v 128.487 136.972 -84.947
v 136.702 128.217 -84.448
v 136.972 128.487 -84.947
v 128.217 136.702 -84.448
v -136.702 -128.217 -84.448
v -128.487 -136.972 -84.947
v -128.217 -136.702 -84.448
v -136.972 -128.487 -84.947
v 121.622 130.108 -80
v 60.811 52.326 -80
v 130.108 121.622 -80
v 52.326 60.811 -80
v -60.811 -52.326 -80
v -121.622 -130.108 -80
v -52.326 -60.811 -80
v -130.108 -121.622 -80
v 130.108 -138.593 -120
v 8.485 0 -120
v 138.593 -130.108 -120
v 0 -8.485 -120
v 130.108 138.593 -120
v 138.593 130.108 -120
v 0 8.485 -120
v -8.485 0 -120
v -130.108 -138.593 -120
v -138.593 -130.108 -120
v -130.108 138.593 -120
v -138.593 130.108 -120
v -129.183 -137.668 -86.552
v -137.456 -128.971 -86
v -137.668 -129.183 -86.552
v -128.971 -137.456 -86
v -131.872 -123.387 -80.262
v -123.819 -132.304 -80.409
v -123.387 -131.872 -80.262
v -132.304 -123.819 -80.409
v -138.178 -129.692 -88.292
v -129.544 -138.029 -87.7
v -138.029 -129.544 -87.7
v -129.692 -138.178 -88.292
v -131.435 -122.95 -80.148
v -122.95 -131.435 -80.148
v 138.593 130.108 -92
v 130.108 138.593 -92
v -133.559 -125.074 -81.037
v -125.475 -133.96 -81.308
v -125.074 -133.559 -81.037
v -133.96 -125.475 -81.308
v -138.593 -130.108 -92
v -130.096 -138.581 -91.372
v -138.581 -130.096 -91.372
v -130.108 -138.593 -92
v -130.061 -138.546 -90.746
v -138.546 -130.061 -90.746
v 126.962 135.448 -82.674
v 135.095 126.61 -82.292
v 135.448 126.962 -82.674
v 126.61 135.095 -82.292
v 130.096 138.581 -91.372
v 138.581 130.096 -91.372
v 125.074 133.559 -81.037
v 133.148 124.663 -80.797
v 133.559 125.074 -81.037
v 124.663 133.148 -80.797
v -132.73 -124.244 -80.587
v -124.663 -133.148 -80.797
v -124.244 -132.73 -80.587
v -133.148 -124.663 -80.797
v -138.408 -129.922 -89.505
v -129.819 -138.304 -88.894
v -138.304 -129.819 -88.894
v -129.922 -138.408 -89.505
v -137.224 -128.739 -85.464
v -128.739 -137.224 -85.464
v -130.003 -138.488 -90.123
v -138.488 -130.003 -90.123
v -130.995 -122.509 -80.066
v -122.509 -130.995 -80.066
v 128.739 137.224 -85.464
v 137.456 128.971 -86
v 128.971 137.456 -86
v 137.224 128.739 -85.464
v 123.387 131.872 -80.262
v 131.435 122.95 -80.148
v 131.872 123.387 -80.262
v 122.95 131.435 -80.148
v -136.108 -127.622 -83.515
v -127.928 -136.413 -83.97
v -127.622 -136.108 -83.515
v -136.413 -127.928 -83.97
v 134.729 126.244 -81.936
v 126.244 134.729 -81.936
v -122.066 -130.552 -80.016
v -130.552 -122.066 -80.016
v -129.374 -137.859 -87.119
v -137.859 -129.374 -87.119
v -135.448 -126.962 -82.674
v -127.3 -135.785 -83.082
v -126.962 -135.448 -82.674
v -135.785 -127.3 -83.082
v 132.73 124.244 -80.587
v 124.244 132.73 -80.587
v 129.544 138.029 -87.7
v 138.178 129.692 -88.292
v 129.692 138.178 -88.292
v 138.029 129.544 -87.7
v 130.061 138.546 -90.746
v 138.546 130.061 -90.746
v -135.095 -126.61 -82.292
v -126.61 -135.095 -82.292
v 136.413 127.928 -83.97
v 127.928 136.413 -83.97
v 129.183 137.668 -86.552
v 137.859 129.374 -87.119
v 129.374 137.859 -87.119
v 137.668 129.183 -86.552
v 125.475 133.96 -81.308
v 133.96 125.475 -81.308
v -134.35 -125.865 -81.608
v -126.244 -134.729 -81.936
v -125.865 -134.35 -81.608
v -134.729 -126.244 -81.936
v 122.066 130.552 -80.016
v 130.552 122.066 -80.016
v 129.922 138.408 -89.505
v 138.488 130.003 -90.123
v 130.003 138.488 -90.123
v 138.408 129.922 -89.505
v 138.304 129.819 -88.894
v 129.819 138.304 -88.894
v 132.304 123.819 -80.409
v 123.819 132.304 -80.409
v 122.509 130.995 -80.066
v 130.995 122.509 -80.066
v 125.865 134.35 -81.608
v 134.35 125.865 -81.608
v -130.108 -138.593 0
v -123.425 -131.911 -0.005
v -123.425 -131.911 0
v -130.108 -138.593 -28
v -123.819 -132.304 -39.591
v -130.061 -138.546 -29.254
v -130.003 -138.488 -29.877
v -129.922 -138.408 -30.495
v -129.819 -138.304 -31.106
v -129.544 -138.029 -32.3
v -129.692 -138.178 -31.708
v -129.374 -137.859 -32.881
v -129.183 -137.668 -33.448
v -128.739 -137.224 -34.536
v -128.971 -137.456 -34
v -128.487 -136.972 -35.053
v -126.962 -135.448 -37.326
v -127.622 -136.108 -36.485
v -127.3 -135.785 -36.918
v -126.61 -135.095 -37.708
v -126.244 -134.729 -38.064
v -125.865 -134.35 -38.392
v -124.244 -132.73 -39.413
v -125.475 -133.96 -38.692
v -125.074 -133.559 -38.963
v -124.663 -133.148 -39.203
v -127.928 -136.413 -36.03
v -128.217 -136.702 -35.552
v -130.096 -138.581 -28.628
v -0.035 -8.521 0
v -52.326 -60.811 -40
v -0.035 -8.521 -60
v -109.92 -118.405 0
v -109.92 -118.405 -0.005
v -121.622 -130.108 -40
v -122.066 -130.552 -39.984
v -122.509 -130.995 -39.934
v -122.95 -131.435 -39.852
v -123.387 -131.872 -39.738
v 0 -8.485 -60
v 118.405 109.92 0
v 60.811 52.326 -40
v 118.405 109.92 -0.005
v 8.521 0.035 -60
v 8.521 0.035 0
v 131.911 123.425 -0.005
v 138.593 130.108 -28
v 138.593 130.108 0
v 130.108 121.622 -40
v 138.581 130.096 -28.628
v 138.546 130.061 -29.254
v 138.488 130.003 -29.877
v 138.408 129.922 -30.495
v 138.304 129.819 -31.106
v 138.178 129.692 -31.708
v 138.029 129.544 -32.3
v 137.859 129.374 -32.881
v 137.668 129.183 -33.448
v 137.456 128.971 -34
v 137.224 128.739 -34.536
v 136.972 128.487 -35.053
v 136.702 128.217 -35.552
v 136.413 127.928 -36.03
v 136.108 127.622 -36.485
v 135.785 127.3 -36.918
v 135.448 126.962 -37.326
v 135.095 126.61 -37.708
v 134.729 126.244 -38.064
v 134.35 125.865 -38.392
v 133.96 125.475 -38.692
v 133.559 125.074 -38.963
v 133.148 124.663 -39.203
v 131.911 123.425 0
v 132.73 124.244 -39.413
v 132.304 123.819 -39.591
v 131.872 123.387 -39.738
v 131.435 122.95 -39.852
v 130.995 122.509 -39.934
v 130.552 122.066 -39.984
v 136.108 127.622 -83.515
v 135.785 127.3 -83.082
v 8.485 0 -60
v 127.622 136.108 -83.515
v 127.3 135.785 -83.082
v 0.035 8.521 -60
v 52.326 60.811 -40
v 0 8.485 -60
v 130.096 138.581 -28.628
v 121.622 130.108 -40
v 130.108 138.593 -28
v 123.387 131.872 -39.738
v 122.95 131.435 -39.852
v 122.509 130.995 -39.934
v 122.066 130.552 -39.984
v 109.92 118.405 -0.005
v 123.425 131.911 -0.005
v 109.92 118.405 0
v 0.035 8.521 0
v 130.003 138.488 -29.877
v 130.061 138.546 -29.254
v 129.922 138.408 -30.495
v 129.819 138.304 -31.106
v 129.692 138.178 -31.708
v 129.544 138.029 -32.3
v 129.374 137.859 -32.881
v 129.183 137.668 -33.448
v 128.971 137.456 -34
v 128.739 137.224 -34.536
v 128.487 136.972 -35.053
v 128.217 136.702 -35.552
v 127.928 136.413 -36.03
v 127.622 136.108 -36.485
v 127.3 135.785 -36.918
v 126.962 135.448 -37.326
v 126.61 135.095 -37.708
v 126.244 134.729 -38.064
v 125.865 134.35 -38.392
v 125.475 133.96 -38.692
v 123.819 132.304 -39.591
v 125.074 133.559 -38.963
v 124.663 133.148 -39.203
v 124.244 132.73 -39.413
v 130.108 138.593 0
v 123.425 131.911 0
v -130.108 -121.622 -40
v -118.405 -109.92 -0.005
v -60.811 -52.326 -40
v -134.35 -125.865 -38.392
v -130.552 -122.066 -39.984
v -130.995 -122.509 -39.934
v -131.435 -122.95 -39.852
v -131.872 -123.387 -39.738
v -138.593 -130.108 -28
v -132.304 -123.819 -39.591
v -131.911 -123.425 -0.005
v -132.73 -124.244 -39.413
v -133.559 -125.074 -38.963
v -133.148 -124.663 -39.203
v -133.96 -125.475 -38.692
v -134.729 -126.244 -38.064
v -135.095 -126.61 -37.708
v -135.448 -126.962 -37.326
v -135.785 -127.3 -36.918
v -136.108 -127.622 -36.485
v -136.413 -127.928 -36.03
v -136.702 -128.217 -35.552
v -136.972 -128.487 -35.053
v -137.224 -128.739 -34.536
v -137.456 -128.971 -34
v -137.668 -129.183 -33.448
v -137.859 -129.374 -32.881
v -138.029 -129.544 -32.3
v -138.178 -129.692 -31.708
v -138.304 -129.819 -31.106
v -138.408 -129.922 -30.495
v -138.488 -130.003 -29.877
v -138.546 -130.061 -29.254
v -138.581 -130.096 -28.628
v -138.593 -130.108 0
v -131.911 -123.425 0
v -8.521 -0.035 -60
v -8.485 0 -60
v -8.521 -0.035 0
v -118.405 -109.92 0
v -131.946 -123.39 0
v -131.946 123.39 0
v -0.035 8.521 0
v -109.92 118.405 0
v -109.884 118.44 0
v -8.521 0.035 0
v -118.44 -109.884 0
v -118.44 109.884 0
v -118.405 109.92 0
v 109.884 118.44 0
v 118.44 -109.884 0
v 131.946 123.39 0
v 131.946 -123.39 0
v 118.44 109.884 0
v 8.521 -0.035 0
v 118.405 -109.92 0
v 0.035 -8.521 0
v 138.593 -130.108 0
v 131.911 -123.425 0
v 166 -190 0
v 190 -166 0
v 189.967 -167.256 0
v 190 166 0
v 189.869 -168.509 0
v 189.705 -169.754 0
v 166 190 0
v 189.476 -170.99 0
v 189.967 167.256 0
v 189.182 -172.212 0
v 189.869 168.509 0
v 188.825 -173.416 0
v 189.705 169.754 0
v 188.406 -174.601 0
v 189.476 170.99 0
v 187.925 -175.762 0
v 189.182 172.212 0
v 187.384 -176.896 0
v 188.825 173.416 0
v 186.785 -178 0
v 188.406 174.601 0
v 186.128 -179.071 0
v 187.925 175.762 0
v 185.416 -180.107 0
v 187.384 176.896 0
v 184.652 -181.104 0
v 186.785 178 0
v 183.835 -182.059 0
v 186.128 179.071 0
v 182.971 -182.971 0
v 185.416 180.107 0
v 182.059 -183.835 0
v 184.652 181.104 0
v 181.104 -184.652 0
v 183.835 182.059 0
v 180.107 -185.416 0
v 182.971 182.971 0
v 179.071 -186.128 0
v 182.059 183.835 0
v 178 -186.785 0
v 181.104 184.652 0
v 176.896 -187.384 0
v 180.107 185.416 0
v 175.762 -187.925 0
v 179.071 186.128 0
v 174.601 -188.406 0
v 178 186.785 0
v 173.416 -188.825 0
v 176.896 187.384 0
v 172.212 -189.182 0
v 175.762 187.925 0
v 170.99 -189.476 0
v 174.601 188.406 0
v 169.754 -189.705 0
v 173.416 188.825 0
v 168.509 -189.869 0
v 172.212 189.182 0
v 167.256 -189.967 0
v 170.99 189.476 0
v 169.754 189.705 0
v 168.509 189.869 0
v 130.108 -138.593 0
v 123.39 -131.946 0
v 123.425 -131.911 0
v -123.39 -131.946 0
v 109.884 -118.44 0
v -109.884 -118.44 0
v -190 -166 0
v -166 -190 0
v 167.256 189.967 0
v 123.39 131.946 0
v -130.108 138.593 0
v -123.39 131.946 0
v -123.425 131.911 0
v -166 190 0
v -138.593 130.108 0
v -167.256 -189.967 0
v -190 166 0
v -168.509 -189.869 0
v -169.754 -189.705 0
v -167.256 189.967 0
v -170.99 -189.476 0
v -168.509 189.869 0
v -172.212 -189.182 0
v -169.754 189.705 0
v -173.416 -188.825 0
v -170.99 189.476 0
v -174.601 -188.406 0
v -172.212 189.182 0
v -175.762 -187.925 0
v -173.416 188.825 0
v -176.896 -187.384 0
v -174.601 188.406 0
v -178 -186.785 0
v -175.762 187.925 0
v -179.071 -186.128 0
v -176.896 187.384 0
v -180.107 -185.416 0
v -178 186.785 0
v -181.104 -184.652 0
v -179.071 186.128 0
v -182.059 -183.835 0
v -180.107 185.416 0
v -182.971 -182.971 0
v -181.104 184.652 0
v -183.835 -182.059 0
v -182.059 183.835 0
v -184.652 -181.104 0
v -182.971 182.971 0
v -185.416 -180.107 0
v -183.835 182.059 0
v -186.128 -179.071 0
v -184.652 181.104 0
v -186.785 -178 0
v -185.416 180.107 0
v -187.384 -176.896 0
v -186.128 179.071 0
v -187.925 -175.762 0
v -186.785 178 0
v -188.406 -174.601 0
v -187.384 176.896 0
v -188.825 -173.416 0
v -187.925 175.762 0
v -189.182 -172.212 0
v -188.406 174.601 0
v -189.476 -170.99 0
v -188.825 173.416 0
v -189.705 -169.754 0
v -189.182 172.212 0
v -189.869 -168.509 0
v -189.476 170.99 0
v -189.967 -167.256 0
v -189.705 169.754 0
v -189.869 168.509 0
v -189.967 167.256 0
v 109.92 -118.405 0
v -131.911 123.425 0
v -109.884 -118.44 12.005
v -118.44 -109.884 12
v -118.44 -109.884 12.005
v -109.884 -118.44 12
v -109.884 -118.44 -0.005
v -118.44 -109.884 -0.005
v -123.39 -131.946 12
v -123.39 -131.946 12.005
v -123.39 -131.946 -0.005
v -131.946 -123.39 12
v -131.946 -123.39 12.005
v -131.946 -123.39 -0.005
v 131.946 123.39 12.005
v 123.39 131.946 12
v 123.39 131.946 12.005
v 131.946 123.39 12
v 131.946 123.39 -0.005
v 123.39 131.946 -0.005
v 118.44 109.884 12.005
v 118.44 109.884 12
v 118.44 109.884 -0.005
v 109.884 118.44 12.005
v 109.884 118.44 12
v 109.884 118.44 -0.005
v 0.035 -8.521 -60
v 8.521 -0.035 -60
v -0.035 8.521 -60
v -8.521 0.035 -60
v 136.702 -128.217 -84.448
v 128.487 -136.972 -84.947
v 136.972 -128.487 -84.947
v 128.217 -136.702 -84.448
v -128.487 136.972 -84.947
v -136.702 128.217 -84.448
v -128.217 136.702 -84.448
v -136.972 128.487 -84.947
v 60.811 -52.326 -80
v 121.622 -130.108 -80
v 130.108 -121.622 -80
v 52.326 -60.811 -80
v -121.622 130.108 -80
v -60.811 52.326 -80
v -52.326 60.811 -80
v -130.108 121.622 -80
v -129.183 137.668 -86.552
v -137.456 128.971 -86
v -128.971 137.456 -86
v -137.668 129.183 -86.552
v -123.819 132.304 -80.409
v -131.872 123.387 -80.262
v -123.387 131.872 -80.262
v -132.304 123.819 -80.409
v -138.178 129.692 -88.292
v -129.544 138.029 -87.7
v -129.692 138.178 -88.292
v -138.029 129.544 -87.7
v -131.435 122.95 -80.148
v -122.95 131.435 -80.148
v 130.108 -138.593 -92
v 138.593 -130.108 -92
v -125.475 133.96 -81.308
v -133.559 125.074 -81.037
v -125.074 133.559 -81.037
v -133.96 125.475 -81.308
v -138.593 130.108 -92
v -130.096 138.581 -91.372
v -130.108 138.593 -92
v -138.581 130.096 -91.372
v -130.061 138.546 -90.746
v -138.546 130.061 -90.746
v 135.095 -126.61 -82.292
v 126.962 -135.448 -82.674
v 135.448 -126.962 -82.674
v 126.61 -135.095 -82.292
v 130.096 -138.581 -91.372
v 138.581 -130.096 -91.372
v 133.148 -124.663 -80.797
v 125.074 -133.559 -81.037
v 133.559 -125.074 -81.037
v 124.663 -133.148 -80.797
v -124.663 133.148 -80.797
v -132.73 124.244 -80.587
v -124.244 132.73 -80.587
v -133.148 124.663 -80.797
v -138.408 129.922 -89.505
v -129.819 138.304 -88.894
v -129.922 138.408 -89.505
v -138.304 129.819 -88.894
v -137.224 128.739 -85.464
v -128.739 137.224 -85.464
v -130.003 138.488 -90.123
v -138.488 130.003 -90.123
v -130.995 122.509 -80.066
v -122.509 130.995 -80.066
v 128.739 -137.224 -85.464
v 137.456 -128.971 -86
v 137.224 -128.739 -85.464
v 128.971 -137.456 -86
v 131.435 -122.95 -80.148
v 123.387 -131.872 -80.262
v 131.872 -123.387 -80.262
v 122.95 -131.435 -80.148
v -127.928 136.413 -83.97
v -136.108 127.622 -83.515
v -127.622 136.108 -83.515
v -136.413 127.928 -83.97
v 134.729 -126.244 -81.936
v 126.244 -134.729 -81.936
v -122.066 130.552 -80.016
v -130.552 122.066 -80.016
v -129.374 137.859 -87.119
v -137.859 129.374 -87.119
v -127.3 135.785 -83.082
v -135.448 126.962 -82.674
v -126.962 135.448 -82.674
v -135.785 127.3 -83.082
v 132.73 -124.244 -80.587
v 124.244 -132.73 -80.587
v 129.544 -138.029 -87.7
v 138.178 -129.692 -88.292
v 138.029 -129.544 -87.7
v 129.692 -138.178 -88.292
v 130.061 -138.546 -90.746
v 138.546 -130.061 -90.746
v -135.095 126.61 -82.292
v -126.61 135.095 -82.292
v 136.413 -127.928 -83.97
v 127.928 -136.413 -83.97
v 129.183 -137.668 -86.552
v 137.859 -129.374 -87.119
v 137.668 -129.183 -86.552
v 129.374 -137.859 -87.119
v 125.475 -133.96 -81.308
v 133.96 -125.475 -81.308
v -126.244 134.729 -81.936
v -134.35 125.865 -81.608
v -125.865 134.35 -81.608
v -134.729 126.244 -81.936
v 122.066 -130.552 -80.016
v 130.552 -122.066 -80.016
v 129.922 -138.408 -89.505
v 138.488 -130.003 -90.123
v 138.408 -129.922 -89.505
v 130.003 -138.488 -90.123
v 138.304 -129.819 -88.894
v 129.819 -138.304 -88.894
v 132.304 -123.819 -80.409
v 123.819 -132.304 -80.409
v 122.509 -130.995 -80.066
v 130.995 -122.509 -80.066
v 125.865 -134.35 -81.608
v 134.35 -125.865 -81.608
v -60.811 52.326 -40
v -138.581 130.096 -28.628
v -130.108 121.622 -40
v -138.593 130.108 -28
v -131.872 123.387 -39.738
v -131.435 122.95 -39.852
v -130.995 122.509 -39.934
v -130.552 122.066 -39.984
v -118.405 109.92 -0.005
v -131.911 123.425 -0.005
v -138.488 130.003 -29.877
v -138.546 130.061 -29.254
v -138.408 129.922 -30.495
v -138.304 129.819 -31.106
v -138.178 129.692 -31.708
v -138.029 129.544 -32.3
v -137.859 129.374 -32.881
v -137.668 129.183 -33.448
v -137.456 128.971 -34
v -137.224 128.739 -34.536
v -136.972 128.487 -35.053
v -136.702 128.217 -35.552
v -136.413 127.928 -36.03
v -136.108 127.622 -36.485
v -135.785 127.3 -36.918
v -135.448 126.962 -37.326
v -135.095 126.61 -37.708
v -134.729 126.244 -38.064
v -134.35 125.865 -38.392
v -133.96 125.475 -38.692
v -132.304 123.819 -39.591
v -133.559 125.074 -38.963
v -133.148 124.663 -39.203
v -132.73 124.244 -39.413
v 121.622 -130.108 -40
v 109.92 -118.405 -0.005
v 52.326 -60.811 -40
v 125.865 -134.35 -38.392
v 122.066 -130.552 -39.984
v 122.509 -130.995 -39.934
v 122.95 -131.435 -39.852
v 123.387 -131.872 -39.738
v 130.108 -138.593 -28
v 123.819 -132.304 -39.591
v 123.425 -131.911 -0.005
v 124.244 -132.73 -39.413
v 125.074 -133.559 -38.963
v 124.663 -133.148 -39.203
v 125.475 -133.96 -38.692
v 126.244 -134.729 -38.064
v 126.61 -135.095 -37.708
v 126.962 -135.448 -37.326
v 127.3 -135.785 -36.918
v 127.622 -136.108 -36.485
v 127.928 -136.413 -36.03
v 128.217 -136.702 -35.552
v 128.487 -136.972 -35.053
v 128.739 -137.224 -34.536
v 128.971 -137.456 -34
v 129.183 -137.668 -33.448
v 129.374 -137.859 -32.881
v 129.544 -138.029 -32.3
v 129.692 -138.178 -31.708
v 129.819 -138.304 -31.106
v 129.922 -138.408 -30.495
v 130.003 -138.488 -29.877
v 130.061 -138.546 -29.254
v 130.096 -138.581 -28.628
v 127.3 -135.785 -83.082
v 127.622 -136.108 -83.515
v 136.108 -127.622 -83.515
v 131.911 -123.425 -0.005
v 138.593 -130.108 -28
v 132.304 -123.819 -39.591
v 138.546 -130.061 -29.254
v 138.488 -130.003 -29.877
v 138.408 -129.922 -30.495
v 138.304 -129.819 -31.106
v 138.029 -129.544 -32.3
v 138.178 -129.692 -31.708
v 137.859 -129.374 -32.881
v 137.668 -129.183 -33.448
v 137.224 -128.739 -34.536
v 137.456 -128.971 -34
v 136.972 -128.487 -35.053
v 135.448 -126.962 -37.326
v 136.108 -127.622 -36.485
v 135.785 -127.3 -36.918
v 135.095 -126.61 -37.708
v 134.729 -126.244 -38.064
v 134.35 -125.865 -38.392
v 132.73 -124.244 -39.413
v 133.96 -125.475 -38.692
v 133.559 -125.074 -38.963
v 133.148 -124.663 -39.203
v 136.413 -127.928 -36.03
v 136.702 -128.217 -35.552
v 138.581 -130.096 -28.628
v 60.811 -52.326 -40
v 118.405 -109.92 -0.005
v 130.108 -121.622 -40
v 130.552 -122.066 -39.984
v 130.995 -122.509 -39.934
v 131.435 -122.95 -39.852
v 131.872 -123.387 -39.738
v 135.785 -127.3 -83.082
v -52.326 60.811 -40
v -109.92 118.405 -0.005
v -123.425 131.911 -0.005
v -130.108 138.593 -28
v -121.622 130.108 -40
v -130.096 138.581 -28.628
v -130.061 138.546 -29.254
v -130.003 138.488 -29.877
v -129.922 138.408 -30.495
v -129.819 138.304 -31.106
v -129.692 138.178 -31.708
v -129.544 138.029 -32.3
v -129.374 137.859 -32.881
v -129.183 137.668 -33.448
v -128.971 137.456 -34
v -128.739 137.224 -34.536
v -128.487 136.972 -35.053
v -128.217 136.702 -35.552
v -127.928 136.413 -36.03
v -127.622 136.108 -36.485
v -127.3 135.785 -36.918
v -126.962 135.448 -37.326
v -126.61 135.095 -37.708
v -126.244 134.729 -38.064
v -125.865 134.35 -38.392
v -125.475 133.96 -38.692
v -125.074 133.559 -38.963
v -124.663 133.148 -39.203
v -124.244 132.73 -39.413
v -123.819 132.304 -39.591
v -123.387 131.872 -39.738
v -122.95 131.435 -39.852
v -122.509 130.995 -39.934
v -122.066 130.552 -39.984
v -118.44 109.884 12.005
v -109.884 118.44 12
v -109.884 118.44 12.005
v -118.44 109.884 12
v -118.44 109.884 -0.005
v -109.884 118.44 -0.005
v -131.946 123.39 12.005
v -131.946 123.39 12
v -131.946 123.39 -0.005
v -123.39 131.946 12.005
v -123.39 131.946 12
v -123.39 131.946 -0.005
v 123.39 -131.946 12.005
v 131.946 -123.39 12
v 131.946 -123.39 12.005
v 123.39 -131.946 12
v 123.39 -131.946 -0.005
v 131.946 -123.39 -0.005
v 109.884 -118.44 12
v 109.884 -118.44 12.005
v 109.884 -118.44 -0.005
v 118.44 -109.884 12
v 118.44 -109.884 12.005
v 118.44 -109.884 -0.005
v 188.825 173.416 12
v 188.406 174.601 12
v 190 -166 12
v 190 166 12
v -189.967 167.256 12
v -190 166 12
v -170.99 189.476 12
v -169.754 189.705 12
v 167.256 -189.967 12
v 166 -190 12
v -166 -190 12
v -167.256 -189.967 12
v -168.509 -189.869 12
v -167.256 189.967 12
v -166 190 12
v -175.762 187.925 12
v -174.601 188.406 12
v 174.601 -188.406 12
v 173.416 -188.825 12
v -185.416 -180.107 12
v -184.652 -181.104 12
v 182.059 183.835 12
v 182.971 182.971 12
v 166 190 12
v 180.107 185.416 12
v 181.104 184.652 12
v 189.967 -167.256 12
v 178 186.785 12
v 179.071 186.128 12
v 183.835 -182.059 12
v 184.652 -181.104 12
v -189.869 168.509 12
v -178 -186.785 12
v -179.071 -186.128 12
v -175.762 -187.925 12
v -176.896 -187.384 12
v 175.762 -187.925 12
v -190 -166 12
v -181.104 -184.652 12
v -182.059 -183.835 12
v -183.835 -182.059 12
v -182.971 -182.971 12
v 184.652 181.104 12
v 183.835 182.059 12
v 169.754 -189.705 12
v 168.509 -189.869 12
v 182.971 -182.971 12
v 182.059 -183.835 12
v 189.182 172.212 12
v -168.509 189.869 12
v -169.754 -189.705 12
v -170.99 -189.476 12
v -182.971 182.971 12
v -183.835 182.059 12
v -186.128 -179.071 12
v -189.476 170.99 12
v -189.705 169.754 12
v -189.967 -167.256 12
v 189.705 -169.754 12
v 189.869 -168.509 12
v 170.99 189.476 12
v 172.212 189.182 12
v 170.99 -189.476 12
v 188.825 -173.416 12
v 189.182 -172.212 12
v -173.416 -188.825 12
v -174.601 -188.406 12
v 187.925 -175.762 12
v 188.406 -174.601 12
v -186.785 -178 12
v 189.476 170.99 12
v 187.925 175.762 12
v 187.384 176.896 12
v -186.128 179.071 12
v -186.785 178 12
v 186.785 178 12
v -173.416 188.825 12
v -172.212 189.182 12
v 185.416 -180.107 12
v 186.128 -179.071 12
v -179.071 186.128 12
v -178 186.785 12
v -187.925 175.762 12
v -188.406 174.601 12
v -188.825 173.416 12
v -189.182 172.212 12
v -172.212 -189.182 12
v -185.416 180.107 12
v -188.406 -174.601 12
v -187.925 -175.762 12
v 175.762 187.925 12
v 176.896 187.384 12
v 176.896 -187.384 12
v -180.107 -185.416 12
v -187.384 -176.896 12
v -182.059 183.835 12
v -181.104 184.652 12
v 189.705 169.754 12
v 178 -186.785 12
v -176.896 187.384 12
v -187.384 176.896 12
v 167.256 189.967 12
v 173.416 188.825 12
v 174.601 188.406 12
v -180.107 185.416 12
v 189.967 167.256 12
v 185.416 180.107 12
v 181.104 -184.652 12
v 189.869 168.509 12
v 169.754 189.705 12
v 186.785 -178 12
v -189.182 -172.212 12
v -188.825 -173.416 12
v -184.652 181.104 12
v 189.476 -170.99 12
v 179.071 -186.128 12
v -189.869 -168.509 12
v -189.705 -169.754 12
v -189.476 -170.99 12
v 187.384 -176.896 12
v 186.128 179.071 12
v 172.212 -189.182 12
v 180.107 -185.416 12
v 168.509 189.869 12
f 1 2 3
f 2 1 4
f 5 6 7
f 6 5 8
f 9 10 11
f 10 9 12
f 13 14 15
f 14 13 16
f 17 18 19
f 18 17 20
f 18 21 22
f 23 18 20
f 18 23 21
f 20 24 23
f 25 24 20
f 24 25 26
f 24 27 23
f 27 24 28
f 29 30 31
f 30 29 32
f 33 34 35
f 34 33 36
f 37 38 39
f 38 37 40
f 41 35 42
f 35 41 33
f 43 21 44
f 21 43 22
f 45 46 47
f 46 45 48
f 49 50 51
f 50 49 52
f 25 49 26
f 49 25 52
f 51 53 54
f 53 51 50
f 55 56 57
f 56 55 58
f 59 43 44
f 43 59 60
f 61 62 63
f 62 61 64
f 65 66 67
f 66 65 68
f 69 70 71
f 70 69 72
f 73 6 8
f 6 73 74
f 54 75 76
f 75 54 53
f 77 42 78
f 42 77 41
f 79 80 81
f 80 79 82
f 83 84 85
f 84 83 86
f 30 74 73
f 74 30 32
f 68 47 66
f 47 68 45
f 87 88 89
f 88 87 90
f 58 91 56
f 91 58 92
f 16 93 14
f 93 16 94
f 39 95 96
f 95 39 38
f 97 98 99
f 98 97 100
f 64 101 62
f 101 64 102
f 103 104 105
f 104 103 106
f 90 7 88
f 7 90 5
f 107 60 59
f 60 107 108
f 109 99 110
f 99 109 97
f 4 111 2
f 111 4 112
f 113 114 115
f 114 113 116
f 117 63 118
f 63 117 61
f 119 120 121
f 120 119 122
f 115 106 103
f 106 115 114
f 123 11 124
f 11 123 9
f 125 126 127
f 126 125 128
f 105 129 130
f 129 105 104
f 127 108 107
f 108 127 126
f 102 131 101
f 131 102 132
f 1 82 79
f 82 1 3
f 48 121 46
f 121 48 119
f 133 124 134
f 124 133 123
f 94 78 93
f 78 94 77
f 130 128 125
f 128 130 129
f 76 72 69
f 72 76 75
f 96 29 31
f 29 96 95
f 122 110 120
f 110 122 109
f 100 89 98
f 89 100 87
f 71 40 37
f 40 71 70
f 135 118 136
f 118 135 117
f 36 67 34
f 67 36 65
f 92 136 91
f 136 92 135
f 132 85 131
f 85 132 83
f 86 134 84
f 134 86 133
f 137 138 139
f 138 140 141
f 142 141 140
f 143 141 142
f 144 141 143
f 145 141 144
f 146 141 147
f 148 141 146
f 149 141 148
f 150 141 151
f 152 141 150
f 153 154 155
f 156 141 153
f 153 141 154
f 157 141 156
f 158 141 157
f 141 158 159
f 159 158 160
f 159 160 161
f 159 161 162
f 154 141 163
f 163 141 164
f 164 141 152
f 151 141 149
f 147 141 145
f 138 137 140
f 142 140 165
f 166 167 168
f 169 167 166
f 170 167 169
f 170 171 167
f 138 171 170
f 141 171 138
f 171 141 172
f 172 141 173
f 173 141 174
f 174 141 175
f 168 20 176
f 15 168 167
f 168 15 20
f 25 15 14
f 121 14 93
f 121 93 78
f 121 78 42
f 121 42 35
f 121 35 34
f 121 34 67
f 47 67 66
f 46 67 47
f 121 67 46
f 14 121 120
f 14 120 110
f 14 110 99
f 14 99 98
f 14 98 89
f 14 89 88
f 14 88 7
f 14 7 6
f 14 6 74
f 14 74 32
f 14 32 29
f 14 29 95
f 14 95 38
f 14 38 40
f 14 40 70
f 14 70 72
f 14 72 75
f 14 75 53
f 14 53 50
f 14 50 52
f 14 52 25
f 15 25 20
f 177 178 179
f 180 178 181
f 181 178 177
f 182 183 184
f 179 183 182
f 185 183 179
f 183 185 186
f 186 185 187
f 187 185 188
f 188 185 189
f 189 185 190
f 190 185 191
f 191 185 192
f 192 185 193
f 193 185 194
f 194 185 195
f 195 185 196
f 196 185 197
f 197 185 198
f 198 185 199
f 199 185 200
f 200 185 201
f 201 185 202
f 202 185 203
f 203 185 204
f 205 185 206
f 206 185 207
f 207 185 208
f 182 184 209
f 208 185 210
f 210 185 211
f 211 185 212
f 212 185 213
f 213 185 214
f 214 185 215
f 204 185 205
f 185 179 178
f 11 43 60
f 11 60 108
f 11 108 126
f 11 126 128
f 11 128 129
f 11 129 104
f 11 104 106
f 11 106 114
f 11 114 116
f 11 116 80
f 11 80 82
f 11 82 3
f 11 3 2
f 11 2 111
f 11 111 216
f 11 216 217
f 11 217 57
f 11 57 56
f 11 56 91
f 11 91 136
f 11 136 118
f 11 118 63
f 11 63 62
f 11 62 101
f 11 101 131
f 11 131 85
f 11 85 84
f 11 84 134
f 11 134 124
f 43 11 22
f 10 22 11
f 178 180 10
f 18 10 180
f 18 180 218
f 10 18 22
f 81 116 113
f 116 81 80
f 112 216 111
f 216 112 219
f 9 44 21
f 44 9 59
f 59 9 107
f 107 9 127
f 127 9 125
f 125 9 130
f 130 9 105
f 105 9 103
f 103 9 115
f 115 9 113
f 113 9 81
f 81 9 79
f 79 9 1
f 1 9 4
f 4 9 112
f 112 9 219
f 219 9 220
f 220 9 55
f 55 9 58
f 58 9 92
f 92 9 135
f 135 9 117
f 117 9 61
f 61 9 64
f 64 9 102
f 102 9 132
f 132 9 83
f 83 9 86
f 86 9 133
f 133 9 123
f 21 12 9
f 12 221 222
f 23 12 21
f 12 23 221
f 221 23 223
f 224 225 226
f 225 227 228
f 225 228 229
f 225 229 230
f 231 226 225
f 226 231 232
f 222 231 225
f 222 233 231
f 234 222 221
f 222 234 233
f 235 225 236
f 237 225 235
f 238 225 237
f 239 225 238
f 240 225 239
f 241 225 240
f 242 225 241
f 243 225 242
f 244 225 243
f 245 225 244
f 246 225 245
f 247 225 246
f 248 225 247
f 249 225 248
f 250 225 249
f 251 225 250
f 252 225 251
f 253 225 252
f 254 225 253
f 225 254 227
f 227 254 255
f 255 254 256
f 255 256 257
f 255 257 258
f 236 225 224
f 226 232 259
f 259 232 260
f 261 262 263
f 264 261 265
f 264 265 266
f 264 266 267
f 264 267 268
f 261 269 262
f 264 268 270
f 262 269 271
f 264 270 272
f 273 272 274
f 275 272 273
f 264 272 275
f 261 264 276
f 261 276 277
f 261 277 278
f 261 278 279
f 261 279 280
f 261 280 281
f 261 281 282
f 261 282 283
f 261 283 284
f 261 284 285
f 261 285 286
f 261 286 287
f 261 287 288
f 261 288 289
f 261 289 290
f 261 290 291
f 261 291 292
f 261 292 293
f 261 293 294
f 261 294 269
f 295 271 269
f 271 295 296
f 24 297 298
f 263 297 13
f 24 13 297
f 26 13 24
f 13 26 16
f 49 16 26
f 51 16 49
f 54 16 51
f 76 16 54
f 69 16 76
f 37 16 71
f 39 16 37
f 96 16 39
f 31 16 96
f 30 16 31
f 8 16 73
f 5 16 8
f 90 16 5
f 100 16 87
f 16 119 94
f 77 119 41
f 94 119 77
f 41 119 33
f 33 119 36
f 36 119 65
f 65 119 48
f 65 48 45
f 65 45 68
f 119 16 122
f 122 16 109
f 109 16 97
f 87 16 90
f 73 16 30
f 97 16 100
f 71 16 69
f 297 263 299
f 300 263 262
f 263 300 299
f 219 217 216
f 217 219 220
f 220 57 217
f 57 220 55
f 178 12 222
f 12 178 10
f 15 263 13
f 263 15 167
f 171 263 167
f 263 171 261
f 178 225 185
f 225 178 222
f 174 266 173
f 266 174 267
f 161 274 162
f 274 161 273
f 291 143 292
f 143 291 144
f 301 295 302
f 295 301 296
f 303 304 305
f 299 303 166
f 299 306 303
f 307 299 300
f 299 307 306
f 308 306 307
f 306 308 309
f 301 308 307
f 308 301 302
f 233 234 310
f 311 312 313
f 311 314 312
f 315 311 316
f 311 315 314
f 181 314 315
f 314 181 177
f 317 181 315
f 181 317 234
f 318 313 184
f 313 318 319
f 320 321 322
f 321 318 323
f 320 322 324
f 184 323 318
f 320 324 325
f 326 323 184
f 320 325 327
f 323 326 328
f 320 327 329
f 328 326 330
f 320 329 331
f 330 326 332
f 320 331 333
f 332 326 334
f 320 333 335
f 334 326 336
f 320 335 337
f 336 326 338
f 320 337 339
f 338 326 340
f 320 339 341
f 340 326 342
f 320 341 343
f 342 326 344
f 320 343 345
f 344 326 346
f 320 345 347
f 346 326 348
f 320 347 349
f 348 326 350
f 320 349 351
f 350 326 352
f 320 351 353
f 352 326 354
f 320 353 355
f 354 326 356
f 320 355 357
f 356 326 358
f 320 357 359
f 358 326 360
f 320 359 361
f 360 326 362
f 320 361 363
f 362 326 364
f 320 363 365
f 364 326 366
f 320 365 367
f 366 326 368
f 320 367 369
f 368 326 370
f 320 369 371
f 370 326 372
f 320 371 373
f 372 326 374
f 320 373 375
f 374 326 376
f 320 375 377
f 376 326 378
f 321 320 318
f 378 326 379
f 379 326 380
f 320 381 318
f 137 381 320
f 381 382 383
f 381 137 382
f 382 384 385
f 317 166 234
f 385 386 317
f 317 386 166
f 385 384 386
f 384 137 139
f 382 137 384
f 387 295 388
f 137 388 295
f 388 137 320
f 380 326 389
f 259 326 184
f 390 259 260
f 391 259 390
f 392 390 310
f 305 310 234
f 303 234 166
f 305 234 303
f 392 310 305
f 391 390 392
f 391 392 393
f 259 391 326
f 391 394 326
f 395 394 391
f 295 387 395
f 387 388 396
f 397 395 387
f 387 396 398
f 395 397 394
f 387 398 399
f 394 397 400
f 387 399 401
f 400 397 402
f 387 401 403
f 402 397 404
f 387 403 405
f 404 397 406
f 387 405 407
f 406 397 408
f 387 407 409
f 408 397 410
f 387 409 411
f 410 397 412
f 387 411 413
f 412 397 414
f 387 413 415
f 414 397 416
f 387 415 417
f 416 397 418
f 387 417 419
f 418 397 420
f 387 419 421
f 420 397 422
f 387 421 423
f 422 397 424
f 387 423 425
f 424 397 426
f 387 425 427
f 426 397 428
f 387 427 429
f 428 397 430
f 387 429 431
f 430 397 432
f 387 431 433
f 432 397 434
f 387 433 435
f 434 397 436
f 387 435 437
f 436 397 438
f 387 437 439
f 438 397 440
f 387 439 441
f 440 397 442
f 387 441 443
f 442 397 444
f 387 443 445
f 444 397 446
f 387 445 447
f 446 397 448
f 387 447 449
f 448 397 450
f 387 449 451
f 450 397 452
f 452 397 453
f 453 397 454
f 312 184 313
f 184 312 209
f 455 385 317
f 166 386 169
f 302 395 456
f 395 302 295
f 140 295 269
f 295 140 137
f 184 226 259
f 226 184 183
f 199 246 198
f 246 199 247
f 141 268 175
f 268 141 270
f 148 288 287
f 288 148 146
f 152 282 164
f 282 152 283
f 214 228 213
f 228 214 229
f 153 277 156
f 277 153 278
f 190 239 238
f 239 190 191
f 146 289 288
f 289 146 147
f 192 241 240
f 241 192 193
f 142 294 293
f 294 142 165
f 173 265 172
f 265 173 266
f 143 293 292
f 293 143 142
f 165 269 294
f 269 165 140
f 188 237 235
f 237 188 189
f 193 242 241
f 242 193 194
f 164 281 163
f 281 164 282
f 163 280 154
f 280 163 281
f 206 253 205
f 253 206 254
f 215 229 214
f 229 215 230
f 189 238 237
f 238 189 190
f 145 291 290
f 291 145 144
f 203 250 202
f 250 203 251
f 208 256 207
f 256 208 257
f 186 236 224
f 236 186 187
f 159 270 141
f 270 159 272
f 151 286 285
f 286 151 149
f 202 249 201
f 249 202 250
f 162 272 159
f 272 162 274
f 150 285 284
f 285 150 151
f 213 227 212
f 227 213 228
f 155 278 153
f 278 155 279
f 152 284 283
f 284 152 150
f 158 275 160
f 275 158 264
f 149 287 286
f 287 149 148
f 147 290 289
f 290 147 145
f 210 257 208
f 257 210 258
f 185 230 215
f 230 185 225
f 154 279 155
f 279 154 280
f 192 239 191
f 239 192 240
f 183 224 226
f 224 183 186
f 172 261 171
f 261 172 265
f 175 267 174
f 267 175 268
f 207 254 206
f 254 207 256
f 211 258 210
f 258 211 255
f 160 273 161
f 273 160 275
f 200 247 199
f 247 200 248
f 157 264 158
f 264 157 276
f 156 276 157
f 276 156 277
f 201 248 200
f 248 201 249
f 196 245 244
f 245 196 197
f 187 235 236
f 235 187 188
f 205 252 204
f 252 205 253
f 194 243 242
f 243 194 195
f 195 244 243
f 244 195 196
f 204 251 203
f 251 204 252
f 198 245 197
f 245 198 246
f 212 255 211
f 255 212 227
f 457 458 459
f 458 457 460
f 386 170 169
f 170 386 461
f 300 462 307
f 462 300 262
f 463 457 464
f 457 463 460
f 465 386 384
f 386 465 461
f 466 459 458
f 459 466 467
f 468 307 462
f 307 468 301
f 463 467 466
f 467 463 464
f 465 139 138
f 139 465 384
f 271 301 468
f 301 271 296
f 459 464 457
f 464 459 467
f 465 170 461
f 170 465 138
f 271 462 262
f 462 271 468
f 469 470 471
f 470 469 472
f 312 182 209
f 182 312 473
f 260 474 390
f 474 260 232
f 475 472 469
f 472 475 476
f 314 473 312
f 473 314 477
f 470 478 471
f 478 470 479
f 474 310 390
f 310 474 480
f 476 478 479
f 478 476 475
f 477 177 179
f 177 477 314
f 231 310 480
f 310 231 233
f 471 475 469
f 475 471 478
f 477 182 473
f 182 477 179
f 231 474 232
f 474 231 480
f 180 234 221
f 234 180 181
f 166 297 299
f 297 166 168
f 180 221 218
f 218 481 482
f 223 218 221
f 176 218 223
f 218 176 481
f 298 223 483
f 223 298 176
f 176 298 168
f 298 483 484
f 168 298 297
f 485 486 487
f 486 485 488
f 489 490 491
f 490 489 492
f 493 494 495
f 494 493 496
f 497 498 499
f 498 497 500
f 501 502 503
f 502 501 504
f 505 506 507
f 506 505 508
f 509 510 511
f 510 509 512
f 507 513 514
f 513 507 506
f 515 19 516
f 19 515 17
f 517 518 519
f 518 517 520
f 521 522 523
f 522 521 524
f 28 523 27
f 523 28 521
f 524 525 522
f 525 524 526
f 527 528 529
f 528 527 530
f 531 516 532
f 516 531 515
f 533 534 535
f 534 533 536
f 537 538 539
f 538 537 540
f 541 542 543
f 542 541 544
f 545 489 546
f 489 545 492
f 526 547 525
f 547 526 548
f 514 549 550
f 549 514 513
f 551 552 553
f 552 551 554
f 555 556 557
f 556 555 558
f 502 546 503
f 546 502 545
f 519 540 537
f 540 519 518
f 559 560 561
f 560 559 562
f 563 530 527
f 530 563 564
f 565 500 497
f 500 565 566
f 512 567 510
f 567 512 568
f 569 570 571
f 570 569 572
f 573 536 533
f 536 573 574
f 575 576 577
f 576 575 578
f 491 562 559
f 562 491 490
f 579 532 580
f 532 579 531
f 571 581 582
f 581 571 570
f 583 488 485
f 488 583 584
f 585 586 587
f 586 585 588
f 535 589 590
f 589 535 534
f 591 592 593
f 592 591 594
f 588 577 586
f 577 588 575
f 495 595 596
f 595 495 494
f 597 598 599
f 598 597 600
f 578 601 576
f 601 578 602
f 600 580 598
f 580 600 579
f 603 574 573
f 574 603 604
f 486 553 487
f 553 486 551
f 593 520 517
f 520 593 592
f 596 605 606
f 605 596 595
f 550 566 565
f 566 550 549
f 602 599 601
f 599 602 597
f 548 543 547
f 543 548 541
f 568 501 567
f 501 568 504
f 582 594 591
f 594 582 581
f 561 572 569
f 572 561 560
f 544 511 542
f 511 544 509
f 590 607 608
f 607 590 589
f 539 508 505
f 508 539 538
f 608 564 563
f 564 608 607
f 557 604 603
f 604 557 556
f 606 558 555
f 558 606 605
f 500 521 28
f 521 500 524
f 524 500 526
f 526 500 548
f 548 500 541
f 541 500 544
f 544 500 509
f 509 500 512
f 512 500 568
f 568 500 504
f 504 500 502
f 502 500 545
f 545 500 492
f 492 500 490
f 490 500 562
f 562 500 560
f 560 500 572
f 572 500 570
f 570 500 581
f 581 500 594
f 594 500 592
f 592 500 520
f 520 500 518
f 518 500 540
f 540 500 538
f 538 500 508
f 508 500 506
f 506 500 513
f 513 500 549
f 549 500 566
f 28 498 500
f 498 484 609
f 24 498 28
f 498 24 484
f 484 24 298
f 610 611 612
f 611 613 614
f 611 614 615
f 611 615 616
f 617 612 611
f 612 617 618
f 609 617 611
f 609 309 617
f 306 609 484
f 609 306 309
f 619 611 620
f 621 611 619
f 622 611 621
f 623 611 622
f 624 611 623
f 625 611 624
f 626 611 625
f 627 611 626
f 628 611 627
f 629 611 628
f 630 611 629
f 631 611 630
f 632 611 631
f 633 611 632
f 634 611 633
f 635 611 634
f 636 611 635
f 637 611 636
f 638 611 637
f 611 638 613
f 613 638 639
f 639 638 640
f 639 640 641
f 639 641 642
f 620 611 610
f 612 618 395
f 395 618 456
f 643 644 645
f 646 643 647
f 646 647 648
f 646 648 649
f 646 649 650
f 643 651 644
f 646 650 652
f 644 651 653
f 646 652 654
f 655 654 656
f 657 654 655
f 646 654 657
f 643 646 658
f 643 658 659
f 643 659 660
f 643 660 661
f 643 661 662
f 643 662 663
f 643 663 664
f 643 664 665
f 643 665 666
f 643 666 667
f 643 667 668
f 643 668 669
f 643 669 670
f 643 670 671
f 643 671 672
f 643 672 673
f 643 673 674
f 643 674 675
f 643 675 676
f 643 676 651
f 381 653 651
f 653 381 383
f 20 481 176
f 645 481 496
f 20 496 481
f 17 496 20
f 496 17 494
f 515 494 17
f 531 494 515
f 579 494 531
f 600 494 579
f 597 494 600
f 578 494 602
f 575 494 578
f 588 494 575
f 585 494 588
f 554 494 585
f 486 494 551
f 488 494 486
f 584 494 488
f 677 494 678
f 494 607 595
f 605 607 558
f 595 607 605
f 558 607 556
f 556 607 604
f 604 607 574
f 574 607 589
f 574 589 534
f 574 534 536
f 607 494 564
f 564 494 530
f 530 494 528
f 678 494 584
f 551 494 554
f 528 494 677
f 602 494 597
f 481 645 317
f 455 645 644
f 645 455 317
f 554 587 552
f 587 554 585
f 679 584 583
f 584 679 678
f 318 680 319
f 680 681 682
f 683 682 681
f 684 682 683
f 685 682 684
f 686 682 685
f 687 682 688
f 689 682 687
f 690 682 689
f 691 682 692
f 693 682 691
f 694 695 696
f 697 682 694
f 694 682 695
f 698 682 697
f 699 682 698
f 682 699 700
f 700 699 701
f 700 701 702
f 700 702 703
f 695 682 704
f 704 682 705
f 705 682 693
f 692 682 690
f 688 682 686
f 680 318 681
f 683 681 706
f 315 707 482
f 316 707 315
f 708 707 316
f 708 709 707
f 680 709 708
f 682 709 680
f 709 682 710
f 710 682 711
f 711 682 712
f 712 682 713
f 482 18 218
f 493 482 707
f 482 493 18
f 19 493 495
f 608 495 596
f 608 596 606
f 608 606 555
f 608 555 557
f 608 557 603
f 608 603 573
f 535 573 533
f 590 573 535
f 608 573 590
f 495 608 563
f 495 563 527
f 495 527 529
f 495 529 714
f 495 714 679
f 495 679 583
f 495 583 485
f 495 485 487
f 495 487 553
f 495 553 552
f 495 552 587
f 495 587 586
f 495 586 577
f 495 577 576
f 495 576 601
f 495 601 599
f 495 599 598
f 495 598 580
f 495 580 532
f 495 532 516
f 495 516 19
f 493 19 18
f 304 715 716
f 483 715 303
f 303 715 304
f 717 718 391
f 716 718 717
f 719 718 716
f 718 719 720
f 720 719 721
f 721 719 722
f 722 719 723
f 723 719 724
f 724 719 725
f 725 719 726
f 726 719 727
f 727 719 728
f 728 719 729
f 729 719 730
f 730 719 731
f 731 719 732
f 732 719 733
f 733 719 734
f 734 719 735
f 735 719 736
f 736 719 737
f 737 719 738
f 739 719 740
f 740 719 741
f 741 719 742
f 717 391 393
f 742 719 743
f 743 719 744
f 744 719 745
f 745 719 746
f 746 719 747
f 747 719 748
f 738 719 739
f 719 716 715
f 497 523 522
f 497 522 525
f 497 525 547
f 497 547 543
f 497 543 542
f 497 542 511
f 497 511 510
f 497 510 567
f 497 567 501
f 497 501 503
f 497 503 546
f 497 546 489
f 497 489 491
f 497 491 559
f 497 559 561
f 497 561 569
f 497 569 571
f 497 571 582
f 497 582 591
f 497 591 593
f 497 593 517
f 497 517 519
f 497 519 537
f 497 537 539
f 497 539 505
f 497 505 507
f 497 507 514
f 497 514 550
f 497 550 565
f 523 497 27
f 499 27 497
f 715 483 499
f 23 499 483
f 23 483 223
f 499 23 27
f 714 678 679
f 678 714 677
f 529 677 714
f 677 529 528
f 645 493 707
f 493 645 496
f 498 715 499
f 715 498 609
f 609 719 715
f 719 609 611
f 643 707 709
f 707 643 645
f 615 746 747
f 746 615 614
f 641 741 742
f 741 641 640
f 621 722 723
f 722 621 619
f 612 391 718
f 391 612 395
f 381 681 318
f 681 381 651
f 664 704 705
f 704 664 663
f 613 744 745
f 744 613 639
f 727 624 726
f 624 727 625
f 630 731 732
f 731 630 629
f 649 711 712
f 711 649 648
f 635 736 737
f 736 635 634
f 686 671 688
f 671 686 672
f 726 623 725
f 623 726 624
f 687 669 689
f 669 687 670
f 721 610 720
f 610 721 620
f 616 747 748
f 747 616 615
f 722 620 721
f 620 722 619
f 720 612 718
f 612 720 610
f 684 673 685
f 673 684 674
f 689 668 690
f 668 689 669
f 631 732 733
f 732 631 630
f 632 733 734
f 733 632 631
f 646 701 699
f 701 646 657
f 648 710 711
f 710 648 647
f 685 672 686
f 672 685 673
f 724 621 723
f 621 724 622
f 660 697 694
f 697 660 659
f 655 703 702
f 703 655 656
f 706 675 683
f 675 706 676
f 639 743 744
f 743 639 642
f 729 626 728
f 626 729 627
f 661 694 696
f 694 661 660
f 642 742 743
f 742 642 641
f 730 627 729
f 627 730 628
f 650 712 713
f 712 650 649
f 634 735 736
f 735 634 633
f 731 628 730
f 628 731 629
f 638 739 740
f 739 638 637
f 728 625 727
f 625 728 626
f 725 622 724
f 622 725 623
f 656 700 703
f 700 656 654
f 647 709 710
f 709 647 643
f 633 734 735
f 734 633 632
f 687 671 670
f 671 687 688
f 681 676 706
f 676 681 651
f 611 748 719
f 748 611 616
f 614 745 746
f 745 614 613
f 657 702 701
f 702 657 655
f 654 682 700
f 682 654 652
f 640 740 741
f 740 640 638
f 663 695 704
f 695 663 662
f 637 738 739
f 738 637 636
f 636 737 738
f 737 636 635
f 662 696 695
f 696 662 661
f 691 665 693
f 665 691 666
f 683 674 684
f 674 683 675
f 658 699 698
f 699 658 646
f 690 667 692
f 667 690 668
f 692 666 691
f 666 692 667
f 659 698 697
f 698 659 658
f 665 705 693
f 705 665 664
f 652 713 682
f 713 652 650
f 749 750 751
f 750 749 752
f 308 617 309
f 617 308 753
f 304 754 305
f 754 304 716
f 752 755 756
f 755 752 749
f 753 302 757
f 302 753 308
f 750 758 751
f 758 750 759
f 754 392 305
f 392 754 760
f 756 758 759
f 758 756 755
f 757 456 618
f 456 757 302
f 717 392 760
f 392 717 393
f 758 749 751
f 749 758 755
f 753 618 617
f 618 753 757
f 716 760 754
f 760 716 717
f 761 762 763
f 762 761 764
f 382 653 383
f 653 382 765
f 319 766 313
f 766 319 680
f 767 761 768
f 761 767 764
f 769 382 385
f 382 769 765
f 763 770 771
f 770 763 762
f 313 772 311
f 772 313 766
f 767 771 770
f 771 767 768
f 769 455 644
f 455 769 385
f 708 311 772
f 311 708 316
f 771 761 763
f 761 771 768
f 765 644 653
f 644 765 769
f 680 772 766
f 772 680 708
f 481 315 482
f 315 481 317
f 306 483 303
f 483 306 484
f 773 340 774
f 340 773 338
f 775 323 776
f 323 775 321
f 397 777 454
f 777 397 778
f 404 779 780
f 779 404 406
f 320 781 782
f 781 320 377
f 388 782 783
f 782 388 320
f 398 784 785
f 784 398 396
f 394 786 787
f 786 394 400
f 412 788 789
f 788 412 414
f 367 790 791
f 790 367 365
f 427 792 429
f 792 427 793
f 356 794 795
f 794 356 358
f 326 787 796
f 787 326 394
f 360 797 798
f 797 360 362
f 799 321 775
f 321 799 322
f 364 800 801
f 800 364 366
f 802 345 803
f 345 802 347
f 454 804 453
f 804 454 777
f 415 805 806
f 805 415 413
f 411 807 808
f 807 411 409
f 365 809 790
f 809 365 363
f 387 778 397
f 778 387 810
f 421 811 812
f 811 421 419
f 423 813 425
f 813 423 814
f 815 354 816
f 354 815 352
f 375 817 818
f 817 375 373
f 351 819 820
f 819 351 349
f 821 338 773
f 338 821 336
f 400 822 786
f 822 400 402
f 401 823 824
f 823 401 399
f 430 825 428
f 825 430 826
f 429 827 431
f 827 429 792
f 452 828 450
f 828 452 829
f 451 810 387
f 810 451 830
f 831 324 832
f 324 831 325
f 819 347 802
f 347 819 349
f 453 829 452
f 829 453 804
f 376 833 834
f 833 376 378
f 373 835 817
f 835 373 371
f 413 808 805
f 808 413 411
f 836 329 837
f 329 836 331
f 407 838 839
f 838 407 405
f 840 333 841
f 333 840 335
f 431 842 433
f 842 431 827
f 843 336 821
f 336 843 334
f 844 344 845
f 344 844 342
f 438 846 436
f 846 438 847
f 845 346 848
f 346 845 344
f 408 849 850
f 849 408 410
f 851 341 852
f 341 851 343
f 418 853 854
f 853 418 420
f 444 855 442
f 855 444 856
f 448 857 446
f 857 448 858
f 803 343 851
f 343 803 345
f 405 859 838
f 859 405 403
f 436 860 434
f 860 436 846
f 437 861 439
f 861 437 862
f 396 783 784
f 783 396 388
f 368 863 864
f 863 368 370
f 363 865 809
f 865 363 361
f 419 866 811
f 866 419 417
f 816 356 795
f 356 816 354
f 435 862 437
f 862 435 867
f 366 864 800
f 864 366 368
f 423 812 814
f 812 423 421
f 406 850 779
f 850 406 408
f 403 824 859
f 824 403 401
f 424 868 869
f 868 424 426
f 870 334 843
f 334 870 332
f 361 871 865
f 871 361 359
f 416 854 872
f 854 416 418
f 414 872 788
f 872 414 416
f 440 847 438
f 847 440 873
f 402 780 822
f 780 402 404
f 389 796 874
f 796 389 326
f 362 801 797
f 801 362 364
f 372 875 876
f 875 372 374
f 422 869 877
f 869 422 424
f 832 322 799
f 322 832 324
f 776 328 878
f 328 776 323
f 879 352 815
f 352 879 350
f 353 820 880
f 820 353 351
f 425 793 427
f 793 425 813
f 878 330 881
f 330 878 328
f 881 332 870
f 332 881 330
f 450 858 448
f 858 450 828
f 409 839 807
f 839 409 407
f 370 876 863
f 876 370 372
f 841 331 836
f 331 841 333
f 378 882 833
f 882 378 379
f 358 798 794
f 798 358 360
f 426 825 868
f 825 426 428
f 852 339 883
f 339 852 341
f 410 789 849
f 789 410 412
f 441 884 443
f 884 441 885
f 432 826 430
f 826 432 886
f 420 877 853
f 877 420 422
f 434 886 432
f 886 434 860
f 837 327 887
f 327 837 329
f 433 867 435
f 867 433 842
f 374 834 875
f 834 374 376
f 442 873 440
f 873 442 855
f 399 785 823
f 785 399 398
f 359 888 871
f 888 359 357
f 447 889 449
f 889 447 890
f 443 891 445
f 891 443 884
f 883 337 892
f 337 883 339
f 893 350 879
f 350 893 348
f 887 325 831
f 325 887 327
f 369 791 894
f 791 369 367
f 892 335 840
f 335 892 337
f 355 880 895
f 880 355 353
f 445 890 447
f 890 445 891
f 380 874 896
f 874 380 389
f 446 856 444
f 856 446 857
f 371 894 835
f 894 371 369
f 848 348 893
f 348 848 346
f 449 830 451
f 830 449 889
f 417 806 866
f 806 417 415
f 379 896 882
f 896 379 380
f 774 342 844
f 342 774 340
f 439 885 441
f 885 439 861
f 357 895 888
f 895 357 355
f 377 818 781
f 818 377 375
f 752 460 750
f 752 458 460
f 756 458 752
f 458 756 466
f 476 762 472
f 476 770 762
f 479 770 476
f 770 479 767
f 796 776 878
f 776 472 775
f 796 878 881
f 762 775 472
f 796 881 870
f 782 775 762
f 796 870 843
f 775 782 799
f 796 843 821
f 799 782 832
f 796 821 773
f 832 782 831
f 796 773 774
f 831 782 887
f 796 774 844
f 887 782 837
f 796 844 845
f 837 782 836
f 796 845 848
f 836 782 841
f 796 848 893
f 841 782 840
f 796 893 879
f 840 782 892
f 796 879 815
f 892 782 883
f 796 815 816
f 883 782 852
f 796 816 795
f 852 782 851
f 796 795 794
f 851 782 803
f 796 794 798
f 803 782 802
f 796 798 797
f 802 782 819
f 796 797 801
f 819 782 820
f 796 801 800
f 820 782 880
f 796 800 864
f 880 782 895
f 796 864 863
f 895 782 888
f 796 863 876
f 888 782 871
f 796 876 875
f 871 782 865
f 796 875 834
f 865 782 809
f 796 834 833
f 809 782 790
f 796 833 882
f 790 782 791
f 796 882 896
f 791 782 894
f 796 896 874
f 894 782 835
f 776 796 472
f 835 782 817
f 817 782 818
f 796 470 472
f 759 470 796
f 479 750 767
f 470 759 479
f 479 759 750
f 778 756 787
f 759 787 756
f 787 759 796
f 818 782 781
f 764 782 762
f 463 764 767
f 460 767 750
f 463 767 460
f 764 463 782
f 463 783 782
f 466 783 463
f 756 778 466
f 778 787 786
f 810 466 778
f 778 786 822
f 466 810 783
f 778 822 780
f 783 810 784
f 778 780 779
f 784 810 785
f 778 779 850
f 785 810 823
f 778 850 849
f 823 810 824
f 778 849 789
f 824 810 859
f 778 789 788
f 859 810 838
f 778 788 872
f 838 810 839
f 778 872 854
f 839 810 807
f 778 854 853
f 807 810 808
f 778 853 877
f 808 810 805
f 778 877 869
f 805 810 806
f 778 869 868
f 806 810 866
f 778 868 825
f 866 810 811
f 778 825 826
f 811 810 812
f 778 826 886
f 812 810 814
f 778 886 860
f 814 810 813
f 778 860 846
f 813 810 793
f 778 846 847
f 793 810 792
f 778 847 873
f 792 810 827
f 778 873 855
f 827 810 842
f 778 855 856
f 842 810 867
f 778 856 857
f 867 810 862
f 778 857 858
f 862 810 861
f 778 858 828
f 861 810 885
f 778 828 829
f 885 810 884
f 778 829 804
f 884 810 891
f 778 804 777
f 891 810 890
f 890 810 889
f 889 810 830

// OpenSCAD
thickness = 12;
cutout_tolerance = .1;
top_edge = 380;
top_radius = 48;
base_span_height = 40;
base_span_radius = 24;
base_stem_height = 40;
base_stem_width = 160;
$fn=120;

module base_span(x,y,z,r){
    translate([-x/2,-y/2,0]){
        hull(){
            translate([r/2,r/2,0]) cube([r,r,z], true);
            translate([-(r/2)+x,r/2,0]) cube([r,r,z], true);
            translate([(r/2),-(r/2)+y,-z/2]) cylinder(h=z,d=r);
            translate([-(r/2)+x,-(r/2)+y,-z/2]) cylinder(h=z,d=r);
        }
    }
}

module base_section(length, span_height, stem_height, stem_width, thickness, radius, tolerance, bottom_notch, top_notch, tab_extra_height){ 
    tab_fraction = 20;
    tab_length = length / tab_fraction;
    notch_height = (span_height * 2 + stem_height) / 2;
    
    difference() {
        translate([0, -(span_height / 2 + stem_height / 2), 0]){
            union(){
                // bottom
                base_span(length, span_height, thickness, radius);
                // stem
                translate([0, span_height / 2 + stem_height / 2, 0]) {
                    cube([stem_width, stem_height, thickness], true);
                }
                // top
                translate([0, span_height / 2 + stem_height + span_height / 2, 0]){
                    mirror([0,1,0]){
                        base_span(length, span_height, thickness, radius);
                    }
                }
                // tab 1
                translate([-length / 2 + tab_length, span_height / 2 + stem_height + span_height + thickness / 2, 0]){
                    cube([tab_length + tolerance, thickness + tab_extra_height, thickness + tolerance], true); 
                }
                // tab 2
                translate([length / 2 - tab_length, span_height / 2 + stem_height + span_height + thickness / 2, 0]){
                    cube([tab_length + tolerance, thickness + tab_extra_height, thickness + tolerance], true);
                }
            }
        }
        // bottom notch
        if (bottom_notch) {
            translate([0, -notch_height / 2, 0]) {
                cube([thickness + tolerance, notch_height, thickness], true);
            }
        }
        // top notch
        if (top_notch) {
            translate([0, notch_height / 2, 0]) {
                cube([thickness + tolerance, notch_height, thickness], true);
            }
        }
    }
}

module top(x,y,z,r){
    translate([-x/2,-y/2,0]){
        hull(){
            translate([r/2,r/2,-z/2]) cylinder(h=z,d=r);
            translate([-(r/2)+x,r/2,-z/2]) cylinder(h=z,d=r);
            translate([(r/2),-(r/2)+y,-z/2]) cylinder(h=z,d=r);
            translate([-(r/2)+x,-(r/2)+y,-z/2]) cylinder(h=z,d=r);
        }
    }
}

module base_assembly(base_edge, base_span_height, base_stem_height, base_stem_width, thickness, base_span_radius, tolerance, tab_extra_height){
    translate([0,0,-(base_span_height + base_stem_height / 2)]){
        union(){
            rotate([90,0,45]){
                base_section(top_edge, base_span_height, base_stem_height, base_stem_width, thickness, base_span_radius, cutout_tolerance, false, true, tab_extra_height);
            }
            rotate([90,0,-45]){
                base_section(top_edge, base_span_height, base_stem_height, base_stem_width, thickness, base_span_radius, cutout_tolerance, false, true, tab_extra_height);
            }
        }
    }
}

module top_assembly(){
    translate([0, 0, thickness / 2]) {
        top(top_edge, top_edge, thickness, top_radius);
    }
}

module table_assembly(){
    color("red"){
        top_assembly(top_edge, top_edge, thickness, top_radius);
    }
    color("olive"){
        base_assembly(top_edge, base_span_height, base_stem_height, base_stem_width, thickness, base_span_radius, 0, 0.01);
    }
}

module top_output(){
    difference(){
        translate([0, 0, thickness / 2]) {
            top(top_edge, top_edge, thickness, top_radius);
        }
        translate([0, 0, -0.1]) {
            base_assembly(top_edge, base_span_height, base_stem_height, base_stem_width, thickness, base_span_radius, cutout_tolerance, 0.3);
        }
    }
}

module base_upper_output(){
    base_section(top_edge, base_span_height, base_stem_height, base_stem_width, thickness, base_span_radius, cutout_tolerance, true, false, 0);
}

module base_lower_output(){
    base_section(top_edge, base_span_height, base_stem_height, base_stem_width, thickness, base_span_radius, cutout_tolerance, false, true, 0);
}

table_assembly();
//top_output();
//base_upper_output();
//base_lower_output();
